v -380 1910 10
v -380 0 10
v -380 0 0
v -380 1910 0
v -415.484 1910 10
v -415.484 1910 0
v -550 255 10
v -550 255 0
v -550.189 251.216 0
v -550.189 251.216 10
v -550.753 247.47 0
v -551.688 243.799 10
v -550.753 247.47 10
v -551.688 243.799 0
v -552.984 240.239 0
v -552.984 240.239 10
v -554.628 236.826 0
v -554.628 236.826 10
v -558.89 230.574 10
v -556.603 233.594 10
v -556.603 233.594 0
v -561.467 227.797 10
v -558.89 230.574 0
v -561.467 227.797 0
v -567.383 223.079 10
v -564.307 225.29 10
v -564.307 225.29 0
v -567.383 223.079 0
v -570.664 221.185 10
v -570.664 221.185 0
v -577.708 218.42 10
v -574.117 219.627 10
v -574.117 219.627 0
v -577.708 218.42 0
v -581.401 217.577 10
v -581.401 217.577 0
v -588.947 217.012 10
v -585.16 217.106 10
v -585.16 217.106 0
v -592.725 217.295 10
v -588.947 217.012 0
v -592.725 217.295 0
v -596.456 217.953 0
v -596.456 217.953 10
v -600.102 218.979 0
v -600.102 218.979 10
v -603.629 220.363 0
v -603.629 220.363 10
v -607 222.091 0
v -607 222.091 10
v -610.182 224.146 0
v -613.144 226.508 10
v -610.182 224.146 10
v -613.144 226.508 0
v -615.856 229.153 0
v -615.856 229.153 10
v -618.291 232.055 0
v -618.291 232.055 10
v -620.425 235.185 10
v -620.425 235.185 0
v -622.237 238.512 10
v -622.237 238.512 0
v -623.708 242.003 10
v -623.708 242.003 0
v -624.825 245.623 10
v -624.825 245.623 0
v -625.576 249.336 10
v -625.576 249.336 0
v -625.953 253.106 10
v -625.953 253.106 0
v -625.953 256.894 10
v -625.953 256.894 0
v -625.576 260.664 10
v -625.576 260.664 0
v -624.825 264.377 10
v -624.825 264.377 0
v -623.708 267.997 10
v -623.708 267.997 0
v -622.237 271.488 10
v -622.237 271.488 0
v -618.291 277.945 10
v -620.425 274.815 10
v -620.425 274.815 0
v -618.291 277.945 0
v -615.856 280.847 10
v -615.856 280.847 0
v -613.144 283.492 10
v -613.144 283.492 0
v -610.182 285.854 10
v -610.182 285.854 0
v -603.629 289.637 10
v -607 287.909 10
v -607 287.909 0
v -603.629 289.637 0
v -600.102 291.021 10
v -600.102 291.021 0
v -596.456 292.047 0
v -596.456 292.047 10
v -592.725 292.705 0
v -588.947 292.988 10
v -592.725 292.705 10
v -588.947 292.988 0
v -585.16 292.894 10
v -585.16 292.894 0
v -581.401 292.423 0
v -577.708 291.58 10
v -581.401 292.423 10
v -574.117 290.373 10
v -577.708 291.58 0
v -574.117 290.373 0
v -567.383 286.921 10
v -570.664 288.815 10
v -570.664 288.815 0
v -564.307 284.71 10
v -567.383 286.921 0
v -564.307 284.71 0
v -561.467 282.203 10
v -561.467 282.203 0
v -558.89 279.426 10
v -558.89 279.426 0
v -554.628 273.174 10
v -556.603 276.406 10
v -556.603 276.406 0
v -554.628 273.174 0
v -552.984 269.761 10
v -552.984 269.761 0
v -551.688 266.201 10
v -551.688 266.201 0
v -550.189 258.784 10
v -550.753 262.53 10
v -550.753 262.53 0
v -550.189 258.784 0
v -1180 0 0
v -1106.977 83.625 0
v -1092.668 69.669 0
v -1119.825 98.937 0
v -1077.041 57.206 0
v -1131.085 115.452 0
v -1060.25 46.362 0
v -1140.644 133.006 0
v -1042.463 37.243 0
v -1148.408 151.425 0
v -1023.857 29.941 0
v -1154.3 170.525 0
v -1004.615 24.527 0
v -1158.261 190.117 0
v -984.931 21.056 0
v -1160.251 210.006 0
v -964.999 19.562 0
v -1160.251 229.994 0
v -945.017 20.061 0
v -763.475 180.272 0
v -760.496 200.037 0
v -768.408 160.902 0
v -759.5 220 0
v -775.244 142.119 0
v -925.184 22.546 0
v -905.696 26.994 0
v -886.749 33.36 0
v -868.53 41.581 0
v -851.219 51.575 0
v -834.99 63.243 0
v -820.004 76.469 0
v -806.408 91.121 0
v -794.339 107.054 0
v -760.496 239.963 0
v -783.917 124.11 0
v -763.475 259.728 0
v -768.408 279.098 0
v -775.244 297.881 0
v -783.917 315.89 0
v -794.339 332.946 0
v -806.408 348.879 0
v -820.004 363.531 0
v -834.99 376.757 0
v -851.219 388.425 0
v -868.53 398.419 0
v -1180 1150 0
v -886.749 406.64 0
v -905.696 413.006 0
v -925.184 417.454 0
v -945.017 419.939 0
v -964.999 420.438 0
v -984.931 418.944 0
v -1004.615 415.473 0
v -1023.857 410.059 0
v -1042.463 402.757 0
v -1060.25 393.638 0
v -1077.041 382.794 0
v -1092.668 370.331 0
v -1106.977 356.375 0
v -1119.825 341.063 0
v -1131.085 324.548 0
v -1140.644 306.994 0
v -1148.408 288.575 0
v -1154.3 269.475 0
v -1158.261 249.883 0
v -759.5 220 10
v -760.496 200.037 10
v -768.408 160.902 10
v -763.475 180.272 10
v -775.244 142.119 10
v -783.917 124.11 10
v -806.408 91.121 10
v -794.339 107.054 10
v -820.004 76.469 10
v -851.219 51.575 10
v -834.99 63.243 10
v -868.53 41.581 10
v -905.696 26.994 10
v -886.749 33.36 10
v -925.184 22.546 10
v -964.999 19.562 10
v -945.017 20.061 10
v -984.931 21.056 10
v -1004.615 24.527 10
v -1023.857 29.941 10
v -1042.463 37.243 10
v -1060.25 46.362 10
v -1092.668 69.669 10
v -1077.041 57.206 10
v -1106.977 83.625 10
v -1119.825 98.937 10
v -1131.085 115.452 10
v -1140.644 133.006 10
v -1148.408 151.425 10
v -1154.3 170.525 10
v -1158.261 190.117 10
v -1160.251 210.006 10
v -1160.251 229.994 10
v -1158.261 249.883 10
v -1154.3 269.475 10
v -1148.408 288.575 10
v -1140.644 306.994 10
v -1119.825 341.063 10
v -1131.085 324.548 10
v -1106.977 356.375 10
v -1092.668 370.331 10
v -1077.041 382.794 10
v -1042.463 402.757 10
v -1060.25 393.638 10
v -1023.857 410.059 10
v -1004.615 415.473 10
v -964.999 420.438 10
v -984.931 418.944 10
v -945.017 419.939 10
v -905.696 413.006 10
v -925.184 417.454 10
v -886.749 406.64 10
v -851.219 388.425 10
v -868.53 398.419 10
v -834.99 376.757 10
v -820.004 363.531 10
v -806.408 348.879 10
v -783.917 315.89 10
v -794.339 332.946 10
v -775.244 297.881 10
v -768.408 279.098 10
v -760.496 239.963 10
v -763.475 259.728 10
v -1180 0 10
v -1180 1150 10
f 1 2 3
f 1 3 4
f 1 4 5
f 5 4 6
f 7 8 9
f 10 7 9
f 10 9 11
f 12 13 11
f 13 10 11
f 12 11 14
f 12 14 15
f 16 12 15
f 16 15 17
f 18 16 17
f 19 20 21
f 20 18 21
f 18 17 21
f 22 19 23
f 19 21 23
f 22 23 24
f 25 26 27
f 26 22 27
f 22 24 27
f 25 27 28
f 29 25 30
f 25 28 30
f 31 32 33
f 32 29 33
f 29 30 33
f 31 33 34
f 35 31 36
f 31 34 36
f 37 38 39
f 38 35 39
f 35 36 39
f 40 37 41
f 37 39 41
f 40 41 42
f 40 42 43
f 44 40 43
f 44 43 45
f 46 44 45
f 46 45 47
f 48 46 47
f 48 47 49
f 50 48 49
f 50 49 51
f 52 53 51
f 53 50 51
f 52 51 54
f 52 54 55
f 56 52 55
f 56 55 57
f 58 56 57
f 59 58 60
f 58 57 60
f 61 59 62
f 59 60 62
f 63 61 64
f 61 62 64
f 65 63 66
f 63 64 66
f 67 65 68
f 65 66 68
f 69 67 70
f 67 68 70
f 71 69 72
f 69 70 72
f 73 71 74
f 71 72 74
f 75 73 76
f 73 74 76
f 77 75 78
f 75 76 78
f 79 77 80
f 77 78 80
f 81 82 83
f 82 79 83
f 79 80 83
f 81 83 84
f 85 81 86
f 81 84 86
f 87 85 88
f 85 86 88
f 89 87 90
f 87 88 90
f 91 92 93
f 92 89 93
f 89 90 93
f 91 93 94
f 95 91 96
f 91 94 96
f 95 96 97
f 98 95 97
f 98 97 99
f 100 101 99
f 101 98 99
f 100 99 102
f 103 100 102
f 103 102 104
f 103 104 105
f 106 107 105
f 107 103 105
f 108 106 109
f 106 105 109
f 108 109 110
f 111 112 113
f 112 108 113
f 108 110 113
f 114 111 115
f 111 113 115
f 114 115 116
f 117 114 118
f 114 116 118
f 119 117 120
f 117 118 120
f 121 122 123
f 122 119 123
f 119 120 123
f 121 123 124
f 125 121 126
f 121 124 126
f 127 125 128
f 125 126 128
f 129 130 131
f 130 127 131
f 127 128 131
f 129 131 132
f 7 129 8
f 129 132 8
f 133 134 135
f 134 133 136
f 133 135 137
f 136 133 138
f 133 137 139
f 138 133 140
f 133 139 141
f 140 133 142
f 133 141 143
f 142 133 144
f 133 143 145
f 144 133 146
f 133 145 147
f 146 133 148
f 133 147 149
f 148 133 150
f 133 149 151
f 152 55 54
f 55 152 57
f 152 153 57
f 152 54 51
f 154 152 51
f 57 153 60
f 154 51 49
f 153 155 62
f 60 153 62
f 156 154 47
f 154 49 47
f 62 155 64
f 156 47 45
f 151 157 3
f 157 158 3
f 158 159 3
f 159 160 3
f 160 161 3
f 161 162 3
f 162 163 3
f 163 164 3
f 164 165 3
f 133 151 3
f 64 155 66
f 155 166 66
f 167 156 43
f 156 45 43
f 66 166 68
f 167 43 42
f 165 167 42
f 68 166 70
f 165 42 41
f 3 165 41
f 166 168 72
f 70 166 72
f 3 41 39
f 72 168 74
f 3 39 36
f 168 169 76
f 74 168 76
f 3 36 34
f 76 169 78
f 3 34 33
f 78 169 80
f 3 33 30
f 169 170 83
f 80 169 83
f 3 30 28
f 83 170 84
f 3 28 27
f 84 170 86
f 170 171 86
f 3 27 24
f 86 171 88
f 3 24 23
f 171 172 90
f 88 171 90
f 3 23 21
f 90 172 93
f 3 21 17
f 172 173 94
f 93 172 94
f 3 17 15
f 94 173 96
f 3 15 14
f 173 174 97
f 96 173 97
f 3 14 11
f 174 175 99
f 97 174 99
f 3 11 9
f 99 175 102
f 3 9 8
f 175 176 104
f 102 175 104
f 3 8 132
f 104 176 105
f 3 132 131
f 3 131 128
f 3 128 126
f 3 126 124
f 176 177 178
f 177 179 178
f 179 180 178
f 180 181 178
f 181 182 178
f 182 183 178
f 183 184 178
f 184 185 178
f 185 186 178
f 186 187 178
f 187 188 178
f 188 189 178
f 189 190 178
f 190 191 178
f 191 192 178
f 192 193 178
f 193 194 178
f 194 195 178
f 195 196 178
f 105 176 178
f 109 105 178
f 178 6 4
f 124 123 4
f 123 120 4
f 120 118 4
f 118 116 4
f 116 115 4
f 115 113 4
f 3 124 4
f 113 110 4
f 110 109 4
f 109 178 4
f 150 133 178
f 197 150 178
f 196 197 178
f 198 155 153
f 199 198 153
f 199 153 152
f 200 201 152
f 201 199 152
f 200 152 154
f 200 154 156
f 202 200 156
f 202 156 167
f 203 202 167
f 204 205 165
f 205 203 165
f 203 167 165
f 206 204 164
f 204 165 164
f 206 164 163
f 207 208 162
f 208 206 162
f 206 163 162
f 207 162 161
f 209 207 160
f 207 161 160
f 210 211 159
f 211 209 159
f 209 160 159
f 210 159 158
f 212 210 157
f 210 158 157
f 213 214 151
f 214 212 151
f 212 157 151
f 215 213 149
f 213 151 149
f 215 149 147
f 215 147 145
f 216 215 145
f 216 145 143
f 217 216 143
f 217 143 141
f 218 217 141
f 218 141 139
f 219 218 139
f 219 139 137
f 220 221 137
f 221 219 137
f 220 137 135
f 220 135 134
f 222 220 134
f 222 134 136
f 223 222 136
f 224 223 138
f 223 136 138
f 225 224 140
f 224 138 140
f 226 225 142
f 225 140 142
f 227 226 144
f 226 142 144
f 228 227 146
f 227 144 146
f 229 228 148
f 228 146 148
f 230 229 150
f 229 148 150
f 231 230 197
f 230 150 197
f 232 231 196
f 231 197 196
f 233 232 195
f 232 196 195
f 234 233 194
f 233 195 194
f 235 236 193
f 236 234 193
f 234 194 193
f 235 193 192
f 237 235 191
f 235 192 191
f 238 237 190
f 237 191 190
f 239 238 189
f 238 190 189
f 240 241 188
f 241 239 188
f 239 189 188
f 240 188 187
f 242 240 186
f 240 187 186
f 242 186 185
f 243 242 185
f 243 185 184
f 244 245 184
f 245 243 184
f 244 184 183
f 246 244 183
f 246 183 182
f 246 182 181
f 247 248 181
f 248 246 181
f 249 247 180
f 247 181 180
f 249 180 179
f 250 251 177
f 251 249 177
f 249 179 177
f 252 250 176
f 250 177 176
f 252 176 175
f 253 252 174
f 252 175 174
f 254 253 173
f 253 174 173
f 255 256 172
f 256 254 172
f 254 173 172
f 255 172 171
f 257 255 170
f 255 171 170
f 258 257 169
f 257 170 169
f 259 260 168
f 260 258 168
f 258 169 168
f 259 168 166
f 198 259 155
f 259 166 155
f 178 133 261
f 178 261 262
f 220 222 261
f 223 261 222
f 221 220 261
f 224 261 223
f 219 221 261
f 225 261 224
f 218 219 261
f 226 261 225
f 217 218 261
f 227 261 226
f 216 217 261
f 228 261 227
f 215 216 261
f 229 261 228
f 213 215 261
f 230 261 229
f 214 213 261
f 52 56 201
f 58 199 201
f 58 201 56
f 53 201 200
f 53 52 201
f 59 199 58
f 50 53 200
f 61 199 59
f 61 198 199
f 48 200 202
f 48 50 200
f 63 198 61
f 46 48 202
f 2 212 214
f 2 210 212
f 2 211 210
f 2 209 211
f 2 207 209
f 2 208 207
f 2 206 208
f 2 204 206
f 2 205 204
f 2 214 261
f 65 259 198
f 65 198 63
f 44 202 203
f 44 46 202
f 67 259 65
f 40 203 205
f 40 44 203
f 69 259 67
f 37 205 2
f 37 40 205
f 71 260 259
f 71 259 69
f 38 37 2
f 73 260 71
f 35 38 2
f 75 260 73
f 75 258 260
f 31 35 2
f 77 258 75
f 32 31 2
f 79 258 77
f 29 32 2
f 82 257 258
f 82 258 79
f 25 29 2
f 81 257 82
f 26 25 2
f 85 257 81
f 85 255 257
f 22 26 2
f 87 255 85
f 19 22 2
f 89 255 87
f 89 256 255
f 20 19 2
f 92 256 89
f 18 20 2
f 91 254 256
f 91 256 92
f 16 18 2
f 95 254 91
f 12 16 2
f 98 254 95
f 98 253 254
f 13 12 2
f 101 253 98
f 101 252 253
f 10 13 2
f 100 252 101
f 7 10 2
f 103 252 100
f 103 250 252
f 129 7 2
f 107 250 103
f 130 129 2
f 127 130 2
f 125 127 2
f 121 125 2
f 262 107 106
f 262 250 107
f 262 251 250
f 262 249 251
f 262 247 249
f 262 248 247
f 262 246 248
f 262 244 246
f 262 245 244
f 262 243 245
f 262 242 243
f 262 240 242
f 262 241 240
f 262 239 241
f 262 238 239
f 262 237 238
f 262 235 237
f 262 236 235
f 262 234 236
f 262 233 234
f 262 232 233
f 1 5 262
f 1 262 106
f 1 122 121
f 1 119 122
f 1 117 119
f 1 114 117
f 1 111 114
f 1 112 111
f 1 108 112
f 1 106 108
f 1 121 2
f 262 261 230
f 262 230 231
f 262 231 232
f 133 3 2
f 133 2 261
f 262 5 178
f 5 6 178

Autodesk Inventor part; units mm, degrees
ref_plane "YZ Plane" through (0, 0, 0) normal (1, 0, 0) x (0, 1, 0)
ref_plane "XZ Plane" through (0, 0, 0) normal (0, 1, 0) x (-1, 0, 0)
ref_plane "XY Plane" through (0, 0, 0) normal (0, 0, 1) x (1, 0, 0)
sketch "Sketch1" plane through (0, 0, 0) normal (0, 0, 1) x (1, 0, 0)
  line L0 (0, 0) -> (0, 1910) construction
  line L1 (424.5155, 1910) -> (-415.4845, 1910)
  line L2 (-415.4845, 1910) -> (-1180, 1150)
  line L3 (-1180, 0) -> (-1180, 1150)
  line L4 (960, 0) -> (960, 1342.8524)
  line L5 (424.5155, 1910) -> (960, 1342.8524)
  circle A0 centre (0, 950) radius 195 construction
  line L6 (960, 0) -> (-1180, 0)
  circle A1 centre (-960, 220) radius 200.5
  circle A2 centre (-588, 255) radius 38
  circle A3 centre (374.6358, 1277) radius 50
  circle A4 centre (0, 950) radius 155
  point P0 (0, 955)
  dimension "d1" = 840
  dimension "d3" = 1150
  dimension "d11" = 390
  dimension "d12" = 1180
  dimension "d13" = 950
  dimension "d14" = 76
  dimension "d15" = 1910
  dimension "d16" = 255
  dimension "d17" = 220
  dimension "d18" = 401
  dimension "d19" = 220
  dimension "d21" = 1277
  dimension "d22" = 1554.6358
  dimension "d23" = 100
  dimension "d33" = 2140
  dimension "d34" = 494
  dimension "d45" = 310
  dimension "d49" = 372
  dimension "d51" = 780
  dimension "d52" = 1078
extrude "Extrusion1" add sketch "Sketch1" along normal blind 10
sketch "Sketch3" plane through (0, 0, 10) normal (0, 0, 1) x (1, 0, 0)
  line L0 (-400, 950) -> (400, 950) construction
  circle A0 centre (0, 950) radius 155 projected
  circle A1 centre (155, 950) radius 2.5
  circle A2 centre (-155, 950) radius 2.5
  line L1 (132.7592, 870) -> (-132.7592, 870) construction
  circle A3 centre (132.7592, 870) radius 2.5
  circle A4 centre (-132.7592, 870) radius 2.5
  point P0 (0, 0)
  point P1 (-154.9798, 947.5001)
  point P2 (-154.9798, 952.4999)
  point P3 (154.9798, 947.5001)
  point P4 (154.9798, 952.4999)
  point P5 (134.0322, 872.1516)
  point P6 (131.4516, 867.8692)
  dimension "d47" = 5
  dimension "d48" = 80
extrude "Extrusion3" cut sketch "Sketch3" against normal through all contours A0 A1 | A0 A2 | A3 A0 | A4 A0 | A0 A4 picked at (155.7492, 949.3589) picked at (-155.8257, 950.101) picked at (133.5004, 869.6223)
sketch "Sketch4" plane through (0, 0, 10) normal (0, 0, 1) x (1, 0, 0)
  arc A0 (154.9798, 947.5001) -> (154.9798, 952.4999) centre (155, 950) ccw projected
  arc A1 (134.0322, 872.1516) -> (154.9798, 947.5001) centre (0, 950) ccw projected
  arc A2 (131.4516, 867.8692) -> (134.0322, 872.1516) centre (132.7592, 870) ccw projected
  arc A3 (-131.4516, 867.8692) -> (131.4516, 867.8692) centre (0, 950) ccw projected
  arc A4 (-134.0322, 872.1516) -> (-131.4516, 867.8692) centre (-132.7592, 870) ccw projected
  arc A5 (-154.9798, 947.5001) -> (-134.0322, 872.1516) centre (0, 950) ccw projected
  arc A6 (-154.9798, 952.4999) -> (-154.9798, 947.5001) centre (-155, 950) ccw projected
  arc A7 (154.9798, 952.4999) -> (-154.9798, 952.4999) centre (0, 950) ccw projected
  line L0 (960, 1342.8524) -> (424.5155, 1910) projected
  line L1 (424.5155, 1910) -> (-415.4845, 1910) projected
  line L2 (-415.4845, 1910) -> (-1180, 1150) projected
  line L3 (-1180, 1150) -> (-1180, 0) projected
  line L4 (-1180, 0) -> (960, 0) projected
  line L5 (960, 0) -> (960, 1342.8524) projected
  circle A8 centre (374.6358, 1277) radius 50 projected
  circle A9 centre (-588, 255) radius 38 projected
  circle A10 centre (-960, 220) radius 200.5 projected
  line L6 (-380, 0) -> (-380, 1910)
  point P0 (0, 0)
  dimension "d53" = 1340
extrude "Extrusion4" cut sketch "Sketch4" against normal through all contours L5 L4 L6 L1 L0
equation "\"d17\" = d19"
properties part number "ДМФ 014 Стенка Нос ЛЕВ"
